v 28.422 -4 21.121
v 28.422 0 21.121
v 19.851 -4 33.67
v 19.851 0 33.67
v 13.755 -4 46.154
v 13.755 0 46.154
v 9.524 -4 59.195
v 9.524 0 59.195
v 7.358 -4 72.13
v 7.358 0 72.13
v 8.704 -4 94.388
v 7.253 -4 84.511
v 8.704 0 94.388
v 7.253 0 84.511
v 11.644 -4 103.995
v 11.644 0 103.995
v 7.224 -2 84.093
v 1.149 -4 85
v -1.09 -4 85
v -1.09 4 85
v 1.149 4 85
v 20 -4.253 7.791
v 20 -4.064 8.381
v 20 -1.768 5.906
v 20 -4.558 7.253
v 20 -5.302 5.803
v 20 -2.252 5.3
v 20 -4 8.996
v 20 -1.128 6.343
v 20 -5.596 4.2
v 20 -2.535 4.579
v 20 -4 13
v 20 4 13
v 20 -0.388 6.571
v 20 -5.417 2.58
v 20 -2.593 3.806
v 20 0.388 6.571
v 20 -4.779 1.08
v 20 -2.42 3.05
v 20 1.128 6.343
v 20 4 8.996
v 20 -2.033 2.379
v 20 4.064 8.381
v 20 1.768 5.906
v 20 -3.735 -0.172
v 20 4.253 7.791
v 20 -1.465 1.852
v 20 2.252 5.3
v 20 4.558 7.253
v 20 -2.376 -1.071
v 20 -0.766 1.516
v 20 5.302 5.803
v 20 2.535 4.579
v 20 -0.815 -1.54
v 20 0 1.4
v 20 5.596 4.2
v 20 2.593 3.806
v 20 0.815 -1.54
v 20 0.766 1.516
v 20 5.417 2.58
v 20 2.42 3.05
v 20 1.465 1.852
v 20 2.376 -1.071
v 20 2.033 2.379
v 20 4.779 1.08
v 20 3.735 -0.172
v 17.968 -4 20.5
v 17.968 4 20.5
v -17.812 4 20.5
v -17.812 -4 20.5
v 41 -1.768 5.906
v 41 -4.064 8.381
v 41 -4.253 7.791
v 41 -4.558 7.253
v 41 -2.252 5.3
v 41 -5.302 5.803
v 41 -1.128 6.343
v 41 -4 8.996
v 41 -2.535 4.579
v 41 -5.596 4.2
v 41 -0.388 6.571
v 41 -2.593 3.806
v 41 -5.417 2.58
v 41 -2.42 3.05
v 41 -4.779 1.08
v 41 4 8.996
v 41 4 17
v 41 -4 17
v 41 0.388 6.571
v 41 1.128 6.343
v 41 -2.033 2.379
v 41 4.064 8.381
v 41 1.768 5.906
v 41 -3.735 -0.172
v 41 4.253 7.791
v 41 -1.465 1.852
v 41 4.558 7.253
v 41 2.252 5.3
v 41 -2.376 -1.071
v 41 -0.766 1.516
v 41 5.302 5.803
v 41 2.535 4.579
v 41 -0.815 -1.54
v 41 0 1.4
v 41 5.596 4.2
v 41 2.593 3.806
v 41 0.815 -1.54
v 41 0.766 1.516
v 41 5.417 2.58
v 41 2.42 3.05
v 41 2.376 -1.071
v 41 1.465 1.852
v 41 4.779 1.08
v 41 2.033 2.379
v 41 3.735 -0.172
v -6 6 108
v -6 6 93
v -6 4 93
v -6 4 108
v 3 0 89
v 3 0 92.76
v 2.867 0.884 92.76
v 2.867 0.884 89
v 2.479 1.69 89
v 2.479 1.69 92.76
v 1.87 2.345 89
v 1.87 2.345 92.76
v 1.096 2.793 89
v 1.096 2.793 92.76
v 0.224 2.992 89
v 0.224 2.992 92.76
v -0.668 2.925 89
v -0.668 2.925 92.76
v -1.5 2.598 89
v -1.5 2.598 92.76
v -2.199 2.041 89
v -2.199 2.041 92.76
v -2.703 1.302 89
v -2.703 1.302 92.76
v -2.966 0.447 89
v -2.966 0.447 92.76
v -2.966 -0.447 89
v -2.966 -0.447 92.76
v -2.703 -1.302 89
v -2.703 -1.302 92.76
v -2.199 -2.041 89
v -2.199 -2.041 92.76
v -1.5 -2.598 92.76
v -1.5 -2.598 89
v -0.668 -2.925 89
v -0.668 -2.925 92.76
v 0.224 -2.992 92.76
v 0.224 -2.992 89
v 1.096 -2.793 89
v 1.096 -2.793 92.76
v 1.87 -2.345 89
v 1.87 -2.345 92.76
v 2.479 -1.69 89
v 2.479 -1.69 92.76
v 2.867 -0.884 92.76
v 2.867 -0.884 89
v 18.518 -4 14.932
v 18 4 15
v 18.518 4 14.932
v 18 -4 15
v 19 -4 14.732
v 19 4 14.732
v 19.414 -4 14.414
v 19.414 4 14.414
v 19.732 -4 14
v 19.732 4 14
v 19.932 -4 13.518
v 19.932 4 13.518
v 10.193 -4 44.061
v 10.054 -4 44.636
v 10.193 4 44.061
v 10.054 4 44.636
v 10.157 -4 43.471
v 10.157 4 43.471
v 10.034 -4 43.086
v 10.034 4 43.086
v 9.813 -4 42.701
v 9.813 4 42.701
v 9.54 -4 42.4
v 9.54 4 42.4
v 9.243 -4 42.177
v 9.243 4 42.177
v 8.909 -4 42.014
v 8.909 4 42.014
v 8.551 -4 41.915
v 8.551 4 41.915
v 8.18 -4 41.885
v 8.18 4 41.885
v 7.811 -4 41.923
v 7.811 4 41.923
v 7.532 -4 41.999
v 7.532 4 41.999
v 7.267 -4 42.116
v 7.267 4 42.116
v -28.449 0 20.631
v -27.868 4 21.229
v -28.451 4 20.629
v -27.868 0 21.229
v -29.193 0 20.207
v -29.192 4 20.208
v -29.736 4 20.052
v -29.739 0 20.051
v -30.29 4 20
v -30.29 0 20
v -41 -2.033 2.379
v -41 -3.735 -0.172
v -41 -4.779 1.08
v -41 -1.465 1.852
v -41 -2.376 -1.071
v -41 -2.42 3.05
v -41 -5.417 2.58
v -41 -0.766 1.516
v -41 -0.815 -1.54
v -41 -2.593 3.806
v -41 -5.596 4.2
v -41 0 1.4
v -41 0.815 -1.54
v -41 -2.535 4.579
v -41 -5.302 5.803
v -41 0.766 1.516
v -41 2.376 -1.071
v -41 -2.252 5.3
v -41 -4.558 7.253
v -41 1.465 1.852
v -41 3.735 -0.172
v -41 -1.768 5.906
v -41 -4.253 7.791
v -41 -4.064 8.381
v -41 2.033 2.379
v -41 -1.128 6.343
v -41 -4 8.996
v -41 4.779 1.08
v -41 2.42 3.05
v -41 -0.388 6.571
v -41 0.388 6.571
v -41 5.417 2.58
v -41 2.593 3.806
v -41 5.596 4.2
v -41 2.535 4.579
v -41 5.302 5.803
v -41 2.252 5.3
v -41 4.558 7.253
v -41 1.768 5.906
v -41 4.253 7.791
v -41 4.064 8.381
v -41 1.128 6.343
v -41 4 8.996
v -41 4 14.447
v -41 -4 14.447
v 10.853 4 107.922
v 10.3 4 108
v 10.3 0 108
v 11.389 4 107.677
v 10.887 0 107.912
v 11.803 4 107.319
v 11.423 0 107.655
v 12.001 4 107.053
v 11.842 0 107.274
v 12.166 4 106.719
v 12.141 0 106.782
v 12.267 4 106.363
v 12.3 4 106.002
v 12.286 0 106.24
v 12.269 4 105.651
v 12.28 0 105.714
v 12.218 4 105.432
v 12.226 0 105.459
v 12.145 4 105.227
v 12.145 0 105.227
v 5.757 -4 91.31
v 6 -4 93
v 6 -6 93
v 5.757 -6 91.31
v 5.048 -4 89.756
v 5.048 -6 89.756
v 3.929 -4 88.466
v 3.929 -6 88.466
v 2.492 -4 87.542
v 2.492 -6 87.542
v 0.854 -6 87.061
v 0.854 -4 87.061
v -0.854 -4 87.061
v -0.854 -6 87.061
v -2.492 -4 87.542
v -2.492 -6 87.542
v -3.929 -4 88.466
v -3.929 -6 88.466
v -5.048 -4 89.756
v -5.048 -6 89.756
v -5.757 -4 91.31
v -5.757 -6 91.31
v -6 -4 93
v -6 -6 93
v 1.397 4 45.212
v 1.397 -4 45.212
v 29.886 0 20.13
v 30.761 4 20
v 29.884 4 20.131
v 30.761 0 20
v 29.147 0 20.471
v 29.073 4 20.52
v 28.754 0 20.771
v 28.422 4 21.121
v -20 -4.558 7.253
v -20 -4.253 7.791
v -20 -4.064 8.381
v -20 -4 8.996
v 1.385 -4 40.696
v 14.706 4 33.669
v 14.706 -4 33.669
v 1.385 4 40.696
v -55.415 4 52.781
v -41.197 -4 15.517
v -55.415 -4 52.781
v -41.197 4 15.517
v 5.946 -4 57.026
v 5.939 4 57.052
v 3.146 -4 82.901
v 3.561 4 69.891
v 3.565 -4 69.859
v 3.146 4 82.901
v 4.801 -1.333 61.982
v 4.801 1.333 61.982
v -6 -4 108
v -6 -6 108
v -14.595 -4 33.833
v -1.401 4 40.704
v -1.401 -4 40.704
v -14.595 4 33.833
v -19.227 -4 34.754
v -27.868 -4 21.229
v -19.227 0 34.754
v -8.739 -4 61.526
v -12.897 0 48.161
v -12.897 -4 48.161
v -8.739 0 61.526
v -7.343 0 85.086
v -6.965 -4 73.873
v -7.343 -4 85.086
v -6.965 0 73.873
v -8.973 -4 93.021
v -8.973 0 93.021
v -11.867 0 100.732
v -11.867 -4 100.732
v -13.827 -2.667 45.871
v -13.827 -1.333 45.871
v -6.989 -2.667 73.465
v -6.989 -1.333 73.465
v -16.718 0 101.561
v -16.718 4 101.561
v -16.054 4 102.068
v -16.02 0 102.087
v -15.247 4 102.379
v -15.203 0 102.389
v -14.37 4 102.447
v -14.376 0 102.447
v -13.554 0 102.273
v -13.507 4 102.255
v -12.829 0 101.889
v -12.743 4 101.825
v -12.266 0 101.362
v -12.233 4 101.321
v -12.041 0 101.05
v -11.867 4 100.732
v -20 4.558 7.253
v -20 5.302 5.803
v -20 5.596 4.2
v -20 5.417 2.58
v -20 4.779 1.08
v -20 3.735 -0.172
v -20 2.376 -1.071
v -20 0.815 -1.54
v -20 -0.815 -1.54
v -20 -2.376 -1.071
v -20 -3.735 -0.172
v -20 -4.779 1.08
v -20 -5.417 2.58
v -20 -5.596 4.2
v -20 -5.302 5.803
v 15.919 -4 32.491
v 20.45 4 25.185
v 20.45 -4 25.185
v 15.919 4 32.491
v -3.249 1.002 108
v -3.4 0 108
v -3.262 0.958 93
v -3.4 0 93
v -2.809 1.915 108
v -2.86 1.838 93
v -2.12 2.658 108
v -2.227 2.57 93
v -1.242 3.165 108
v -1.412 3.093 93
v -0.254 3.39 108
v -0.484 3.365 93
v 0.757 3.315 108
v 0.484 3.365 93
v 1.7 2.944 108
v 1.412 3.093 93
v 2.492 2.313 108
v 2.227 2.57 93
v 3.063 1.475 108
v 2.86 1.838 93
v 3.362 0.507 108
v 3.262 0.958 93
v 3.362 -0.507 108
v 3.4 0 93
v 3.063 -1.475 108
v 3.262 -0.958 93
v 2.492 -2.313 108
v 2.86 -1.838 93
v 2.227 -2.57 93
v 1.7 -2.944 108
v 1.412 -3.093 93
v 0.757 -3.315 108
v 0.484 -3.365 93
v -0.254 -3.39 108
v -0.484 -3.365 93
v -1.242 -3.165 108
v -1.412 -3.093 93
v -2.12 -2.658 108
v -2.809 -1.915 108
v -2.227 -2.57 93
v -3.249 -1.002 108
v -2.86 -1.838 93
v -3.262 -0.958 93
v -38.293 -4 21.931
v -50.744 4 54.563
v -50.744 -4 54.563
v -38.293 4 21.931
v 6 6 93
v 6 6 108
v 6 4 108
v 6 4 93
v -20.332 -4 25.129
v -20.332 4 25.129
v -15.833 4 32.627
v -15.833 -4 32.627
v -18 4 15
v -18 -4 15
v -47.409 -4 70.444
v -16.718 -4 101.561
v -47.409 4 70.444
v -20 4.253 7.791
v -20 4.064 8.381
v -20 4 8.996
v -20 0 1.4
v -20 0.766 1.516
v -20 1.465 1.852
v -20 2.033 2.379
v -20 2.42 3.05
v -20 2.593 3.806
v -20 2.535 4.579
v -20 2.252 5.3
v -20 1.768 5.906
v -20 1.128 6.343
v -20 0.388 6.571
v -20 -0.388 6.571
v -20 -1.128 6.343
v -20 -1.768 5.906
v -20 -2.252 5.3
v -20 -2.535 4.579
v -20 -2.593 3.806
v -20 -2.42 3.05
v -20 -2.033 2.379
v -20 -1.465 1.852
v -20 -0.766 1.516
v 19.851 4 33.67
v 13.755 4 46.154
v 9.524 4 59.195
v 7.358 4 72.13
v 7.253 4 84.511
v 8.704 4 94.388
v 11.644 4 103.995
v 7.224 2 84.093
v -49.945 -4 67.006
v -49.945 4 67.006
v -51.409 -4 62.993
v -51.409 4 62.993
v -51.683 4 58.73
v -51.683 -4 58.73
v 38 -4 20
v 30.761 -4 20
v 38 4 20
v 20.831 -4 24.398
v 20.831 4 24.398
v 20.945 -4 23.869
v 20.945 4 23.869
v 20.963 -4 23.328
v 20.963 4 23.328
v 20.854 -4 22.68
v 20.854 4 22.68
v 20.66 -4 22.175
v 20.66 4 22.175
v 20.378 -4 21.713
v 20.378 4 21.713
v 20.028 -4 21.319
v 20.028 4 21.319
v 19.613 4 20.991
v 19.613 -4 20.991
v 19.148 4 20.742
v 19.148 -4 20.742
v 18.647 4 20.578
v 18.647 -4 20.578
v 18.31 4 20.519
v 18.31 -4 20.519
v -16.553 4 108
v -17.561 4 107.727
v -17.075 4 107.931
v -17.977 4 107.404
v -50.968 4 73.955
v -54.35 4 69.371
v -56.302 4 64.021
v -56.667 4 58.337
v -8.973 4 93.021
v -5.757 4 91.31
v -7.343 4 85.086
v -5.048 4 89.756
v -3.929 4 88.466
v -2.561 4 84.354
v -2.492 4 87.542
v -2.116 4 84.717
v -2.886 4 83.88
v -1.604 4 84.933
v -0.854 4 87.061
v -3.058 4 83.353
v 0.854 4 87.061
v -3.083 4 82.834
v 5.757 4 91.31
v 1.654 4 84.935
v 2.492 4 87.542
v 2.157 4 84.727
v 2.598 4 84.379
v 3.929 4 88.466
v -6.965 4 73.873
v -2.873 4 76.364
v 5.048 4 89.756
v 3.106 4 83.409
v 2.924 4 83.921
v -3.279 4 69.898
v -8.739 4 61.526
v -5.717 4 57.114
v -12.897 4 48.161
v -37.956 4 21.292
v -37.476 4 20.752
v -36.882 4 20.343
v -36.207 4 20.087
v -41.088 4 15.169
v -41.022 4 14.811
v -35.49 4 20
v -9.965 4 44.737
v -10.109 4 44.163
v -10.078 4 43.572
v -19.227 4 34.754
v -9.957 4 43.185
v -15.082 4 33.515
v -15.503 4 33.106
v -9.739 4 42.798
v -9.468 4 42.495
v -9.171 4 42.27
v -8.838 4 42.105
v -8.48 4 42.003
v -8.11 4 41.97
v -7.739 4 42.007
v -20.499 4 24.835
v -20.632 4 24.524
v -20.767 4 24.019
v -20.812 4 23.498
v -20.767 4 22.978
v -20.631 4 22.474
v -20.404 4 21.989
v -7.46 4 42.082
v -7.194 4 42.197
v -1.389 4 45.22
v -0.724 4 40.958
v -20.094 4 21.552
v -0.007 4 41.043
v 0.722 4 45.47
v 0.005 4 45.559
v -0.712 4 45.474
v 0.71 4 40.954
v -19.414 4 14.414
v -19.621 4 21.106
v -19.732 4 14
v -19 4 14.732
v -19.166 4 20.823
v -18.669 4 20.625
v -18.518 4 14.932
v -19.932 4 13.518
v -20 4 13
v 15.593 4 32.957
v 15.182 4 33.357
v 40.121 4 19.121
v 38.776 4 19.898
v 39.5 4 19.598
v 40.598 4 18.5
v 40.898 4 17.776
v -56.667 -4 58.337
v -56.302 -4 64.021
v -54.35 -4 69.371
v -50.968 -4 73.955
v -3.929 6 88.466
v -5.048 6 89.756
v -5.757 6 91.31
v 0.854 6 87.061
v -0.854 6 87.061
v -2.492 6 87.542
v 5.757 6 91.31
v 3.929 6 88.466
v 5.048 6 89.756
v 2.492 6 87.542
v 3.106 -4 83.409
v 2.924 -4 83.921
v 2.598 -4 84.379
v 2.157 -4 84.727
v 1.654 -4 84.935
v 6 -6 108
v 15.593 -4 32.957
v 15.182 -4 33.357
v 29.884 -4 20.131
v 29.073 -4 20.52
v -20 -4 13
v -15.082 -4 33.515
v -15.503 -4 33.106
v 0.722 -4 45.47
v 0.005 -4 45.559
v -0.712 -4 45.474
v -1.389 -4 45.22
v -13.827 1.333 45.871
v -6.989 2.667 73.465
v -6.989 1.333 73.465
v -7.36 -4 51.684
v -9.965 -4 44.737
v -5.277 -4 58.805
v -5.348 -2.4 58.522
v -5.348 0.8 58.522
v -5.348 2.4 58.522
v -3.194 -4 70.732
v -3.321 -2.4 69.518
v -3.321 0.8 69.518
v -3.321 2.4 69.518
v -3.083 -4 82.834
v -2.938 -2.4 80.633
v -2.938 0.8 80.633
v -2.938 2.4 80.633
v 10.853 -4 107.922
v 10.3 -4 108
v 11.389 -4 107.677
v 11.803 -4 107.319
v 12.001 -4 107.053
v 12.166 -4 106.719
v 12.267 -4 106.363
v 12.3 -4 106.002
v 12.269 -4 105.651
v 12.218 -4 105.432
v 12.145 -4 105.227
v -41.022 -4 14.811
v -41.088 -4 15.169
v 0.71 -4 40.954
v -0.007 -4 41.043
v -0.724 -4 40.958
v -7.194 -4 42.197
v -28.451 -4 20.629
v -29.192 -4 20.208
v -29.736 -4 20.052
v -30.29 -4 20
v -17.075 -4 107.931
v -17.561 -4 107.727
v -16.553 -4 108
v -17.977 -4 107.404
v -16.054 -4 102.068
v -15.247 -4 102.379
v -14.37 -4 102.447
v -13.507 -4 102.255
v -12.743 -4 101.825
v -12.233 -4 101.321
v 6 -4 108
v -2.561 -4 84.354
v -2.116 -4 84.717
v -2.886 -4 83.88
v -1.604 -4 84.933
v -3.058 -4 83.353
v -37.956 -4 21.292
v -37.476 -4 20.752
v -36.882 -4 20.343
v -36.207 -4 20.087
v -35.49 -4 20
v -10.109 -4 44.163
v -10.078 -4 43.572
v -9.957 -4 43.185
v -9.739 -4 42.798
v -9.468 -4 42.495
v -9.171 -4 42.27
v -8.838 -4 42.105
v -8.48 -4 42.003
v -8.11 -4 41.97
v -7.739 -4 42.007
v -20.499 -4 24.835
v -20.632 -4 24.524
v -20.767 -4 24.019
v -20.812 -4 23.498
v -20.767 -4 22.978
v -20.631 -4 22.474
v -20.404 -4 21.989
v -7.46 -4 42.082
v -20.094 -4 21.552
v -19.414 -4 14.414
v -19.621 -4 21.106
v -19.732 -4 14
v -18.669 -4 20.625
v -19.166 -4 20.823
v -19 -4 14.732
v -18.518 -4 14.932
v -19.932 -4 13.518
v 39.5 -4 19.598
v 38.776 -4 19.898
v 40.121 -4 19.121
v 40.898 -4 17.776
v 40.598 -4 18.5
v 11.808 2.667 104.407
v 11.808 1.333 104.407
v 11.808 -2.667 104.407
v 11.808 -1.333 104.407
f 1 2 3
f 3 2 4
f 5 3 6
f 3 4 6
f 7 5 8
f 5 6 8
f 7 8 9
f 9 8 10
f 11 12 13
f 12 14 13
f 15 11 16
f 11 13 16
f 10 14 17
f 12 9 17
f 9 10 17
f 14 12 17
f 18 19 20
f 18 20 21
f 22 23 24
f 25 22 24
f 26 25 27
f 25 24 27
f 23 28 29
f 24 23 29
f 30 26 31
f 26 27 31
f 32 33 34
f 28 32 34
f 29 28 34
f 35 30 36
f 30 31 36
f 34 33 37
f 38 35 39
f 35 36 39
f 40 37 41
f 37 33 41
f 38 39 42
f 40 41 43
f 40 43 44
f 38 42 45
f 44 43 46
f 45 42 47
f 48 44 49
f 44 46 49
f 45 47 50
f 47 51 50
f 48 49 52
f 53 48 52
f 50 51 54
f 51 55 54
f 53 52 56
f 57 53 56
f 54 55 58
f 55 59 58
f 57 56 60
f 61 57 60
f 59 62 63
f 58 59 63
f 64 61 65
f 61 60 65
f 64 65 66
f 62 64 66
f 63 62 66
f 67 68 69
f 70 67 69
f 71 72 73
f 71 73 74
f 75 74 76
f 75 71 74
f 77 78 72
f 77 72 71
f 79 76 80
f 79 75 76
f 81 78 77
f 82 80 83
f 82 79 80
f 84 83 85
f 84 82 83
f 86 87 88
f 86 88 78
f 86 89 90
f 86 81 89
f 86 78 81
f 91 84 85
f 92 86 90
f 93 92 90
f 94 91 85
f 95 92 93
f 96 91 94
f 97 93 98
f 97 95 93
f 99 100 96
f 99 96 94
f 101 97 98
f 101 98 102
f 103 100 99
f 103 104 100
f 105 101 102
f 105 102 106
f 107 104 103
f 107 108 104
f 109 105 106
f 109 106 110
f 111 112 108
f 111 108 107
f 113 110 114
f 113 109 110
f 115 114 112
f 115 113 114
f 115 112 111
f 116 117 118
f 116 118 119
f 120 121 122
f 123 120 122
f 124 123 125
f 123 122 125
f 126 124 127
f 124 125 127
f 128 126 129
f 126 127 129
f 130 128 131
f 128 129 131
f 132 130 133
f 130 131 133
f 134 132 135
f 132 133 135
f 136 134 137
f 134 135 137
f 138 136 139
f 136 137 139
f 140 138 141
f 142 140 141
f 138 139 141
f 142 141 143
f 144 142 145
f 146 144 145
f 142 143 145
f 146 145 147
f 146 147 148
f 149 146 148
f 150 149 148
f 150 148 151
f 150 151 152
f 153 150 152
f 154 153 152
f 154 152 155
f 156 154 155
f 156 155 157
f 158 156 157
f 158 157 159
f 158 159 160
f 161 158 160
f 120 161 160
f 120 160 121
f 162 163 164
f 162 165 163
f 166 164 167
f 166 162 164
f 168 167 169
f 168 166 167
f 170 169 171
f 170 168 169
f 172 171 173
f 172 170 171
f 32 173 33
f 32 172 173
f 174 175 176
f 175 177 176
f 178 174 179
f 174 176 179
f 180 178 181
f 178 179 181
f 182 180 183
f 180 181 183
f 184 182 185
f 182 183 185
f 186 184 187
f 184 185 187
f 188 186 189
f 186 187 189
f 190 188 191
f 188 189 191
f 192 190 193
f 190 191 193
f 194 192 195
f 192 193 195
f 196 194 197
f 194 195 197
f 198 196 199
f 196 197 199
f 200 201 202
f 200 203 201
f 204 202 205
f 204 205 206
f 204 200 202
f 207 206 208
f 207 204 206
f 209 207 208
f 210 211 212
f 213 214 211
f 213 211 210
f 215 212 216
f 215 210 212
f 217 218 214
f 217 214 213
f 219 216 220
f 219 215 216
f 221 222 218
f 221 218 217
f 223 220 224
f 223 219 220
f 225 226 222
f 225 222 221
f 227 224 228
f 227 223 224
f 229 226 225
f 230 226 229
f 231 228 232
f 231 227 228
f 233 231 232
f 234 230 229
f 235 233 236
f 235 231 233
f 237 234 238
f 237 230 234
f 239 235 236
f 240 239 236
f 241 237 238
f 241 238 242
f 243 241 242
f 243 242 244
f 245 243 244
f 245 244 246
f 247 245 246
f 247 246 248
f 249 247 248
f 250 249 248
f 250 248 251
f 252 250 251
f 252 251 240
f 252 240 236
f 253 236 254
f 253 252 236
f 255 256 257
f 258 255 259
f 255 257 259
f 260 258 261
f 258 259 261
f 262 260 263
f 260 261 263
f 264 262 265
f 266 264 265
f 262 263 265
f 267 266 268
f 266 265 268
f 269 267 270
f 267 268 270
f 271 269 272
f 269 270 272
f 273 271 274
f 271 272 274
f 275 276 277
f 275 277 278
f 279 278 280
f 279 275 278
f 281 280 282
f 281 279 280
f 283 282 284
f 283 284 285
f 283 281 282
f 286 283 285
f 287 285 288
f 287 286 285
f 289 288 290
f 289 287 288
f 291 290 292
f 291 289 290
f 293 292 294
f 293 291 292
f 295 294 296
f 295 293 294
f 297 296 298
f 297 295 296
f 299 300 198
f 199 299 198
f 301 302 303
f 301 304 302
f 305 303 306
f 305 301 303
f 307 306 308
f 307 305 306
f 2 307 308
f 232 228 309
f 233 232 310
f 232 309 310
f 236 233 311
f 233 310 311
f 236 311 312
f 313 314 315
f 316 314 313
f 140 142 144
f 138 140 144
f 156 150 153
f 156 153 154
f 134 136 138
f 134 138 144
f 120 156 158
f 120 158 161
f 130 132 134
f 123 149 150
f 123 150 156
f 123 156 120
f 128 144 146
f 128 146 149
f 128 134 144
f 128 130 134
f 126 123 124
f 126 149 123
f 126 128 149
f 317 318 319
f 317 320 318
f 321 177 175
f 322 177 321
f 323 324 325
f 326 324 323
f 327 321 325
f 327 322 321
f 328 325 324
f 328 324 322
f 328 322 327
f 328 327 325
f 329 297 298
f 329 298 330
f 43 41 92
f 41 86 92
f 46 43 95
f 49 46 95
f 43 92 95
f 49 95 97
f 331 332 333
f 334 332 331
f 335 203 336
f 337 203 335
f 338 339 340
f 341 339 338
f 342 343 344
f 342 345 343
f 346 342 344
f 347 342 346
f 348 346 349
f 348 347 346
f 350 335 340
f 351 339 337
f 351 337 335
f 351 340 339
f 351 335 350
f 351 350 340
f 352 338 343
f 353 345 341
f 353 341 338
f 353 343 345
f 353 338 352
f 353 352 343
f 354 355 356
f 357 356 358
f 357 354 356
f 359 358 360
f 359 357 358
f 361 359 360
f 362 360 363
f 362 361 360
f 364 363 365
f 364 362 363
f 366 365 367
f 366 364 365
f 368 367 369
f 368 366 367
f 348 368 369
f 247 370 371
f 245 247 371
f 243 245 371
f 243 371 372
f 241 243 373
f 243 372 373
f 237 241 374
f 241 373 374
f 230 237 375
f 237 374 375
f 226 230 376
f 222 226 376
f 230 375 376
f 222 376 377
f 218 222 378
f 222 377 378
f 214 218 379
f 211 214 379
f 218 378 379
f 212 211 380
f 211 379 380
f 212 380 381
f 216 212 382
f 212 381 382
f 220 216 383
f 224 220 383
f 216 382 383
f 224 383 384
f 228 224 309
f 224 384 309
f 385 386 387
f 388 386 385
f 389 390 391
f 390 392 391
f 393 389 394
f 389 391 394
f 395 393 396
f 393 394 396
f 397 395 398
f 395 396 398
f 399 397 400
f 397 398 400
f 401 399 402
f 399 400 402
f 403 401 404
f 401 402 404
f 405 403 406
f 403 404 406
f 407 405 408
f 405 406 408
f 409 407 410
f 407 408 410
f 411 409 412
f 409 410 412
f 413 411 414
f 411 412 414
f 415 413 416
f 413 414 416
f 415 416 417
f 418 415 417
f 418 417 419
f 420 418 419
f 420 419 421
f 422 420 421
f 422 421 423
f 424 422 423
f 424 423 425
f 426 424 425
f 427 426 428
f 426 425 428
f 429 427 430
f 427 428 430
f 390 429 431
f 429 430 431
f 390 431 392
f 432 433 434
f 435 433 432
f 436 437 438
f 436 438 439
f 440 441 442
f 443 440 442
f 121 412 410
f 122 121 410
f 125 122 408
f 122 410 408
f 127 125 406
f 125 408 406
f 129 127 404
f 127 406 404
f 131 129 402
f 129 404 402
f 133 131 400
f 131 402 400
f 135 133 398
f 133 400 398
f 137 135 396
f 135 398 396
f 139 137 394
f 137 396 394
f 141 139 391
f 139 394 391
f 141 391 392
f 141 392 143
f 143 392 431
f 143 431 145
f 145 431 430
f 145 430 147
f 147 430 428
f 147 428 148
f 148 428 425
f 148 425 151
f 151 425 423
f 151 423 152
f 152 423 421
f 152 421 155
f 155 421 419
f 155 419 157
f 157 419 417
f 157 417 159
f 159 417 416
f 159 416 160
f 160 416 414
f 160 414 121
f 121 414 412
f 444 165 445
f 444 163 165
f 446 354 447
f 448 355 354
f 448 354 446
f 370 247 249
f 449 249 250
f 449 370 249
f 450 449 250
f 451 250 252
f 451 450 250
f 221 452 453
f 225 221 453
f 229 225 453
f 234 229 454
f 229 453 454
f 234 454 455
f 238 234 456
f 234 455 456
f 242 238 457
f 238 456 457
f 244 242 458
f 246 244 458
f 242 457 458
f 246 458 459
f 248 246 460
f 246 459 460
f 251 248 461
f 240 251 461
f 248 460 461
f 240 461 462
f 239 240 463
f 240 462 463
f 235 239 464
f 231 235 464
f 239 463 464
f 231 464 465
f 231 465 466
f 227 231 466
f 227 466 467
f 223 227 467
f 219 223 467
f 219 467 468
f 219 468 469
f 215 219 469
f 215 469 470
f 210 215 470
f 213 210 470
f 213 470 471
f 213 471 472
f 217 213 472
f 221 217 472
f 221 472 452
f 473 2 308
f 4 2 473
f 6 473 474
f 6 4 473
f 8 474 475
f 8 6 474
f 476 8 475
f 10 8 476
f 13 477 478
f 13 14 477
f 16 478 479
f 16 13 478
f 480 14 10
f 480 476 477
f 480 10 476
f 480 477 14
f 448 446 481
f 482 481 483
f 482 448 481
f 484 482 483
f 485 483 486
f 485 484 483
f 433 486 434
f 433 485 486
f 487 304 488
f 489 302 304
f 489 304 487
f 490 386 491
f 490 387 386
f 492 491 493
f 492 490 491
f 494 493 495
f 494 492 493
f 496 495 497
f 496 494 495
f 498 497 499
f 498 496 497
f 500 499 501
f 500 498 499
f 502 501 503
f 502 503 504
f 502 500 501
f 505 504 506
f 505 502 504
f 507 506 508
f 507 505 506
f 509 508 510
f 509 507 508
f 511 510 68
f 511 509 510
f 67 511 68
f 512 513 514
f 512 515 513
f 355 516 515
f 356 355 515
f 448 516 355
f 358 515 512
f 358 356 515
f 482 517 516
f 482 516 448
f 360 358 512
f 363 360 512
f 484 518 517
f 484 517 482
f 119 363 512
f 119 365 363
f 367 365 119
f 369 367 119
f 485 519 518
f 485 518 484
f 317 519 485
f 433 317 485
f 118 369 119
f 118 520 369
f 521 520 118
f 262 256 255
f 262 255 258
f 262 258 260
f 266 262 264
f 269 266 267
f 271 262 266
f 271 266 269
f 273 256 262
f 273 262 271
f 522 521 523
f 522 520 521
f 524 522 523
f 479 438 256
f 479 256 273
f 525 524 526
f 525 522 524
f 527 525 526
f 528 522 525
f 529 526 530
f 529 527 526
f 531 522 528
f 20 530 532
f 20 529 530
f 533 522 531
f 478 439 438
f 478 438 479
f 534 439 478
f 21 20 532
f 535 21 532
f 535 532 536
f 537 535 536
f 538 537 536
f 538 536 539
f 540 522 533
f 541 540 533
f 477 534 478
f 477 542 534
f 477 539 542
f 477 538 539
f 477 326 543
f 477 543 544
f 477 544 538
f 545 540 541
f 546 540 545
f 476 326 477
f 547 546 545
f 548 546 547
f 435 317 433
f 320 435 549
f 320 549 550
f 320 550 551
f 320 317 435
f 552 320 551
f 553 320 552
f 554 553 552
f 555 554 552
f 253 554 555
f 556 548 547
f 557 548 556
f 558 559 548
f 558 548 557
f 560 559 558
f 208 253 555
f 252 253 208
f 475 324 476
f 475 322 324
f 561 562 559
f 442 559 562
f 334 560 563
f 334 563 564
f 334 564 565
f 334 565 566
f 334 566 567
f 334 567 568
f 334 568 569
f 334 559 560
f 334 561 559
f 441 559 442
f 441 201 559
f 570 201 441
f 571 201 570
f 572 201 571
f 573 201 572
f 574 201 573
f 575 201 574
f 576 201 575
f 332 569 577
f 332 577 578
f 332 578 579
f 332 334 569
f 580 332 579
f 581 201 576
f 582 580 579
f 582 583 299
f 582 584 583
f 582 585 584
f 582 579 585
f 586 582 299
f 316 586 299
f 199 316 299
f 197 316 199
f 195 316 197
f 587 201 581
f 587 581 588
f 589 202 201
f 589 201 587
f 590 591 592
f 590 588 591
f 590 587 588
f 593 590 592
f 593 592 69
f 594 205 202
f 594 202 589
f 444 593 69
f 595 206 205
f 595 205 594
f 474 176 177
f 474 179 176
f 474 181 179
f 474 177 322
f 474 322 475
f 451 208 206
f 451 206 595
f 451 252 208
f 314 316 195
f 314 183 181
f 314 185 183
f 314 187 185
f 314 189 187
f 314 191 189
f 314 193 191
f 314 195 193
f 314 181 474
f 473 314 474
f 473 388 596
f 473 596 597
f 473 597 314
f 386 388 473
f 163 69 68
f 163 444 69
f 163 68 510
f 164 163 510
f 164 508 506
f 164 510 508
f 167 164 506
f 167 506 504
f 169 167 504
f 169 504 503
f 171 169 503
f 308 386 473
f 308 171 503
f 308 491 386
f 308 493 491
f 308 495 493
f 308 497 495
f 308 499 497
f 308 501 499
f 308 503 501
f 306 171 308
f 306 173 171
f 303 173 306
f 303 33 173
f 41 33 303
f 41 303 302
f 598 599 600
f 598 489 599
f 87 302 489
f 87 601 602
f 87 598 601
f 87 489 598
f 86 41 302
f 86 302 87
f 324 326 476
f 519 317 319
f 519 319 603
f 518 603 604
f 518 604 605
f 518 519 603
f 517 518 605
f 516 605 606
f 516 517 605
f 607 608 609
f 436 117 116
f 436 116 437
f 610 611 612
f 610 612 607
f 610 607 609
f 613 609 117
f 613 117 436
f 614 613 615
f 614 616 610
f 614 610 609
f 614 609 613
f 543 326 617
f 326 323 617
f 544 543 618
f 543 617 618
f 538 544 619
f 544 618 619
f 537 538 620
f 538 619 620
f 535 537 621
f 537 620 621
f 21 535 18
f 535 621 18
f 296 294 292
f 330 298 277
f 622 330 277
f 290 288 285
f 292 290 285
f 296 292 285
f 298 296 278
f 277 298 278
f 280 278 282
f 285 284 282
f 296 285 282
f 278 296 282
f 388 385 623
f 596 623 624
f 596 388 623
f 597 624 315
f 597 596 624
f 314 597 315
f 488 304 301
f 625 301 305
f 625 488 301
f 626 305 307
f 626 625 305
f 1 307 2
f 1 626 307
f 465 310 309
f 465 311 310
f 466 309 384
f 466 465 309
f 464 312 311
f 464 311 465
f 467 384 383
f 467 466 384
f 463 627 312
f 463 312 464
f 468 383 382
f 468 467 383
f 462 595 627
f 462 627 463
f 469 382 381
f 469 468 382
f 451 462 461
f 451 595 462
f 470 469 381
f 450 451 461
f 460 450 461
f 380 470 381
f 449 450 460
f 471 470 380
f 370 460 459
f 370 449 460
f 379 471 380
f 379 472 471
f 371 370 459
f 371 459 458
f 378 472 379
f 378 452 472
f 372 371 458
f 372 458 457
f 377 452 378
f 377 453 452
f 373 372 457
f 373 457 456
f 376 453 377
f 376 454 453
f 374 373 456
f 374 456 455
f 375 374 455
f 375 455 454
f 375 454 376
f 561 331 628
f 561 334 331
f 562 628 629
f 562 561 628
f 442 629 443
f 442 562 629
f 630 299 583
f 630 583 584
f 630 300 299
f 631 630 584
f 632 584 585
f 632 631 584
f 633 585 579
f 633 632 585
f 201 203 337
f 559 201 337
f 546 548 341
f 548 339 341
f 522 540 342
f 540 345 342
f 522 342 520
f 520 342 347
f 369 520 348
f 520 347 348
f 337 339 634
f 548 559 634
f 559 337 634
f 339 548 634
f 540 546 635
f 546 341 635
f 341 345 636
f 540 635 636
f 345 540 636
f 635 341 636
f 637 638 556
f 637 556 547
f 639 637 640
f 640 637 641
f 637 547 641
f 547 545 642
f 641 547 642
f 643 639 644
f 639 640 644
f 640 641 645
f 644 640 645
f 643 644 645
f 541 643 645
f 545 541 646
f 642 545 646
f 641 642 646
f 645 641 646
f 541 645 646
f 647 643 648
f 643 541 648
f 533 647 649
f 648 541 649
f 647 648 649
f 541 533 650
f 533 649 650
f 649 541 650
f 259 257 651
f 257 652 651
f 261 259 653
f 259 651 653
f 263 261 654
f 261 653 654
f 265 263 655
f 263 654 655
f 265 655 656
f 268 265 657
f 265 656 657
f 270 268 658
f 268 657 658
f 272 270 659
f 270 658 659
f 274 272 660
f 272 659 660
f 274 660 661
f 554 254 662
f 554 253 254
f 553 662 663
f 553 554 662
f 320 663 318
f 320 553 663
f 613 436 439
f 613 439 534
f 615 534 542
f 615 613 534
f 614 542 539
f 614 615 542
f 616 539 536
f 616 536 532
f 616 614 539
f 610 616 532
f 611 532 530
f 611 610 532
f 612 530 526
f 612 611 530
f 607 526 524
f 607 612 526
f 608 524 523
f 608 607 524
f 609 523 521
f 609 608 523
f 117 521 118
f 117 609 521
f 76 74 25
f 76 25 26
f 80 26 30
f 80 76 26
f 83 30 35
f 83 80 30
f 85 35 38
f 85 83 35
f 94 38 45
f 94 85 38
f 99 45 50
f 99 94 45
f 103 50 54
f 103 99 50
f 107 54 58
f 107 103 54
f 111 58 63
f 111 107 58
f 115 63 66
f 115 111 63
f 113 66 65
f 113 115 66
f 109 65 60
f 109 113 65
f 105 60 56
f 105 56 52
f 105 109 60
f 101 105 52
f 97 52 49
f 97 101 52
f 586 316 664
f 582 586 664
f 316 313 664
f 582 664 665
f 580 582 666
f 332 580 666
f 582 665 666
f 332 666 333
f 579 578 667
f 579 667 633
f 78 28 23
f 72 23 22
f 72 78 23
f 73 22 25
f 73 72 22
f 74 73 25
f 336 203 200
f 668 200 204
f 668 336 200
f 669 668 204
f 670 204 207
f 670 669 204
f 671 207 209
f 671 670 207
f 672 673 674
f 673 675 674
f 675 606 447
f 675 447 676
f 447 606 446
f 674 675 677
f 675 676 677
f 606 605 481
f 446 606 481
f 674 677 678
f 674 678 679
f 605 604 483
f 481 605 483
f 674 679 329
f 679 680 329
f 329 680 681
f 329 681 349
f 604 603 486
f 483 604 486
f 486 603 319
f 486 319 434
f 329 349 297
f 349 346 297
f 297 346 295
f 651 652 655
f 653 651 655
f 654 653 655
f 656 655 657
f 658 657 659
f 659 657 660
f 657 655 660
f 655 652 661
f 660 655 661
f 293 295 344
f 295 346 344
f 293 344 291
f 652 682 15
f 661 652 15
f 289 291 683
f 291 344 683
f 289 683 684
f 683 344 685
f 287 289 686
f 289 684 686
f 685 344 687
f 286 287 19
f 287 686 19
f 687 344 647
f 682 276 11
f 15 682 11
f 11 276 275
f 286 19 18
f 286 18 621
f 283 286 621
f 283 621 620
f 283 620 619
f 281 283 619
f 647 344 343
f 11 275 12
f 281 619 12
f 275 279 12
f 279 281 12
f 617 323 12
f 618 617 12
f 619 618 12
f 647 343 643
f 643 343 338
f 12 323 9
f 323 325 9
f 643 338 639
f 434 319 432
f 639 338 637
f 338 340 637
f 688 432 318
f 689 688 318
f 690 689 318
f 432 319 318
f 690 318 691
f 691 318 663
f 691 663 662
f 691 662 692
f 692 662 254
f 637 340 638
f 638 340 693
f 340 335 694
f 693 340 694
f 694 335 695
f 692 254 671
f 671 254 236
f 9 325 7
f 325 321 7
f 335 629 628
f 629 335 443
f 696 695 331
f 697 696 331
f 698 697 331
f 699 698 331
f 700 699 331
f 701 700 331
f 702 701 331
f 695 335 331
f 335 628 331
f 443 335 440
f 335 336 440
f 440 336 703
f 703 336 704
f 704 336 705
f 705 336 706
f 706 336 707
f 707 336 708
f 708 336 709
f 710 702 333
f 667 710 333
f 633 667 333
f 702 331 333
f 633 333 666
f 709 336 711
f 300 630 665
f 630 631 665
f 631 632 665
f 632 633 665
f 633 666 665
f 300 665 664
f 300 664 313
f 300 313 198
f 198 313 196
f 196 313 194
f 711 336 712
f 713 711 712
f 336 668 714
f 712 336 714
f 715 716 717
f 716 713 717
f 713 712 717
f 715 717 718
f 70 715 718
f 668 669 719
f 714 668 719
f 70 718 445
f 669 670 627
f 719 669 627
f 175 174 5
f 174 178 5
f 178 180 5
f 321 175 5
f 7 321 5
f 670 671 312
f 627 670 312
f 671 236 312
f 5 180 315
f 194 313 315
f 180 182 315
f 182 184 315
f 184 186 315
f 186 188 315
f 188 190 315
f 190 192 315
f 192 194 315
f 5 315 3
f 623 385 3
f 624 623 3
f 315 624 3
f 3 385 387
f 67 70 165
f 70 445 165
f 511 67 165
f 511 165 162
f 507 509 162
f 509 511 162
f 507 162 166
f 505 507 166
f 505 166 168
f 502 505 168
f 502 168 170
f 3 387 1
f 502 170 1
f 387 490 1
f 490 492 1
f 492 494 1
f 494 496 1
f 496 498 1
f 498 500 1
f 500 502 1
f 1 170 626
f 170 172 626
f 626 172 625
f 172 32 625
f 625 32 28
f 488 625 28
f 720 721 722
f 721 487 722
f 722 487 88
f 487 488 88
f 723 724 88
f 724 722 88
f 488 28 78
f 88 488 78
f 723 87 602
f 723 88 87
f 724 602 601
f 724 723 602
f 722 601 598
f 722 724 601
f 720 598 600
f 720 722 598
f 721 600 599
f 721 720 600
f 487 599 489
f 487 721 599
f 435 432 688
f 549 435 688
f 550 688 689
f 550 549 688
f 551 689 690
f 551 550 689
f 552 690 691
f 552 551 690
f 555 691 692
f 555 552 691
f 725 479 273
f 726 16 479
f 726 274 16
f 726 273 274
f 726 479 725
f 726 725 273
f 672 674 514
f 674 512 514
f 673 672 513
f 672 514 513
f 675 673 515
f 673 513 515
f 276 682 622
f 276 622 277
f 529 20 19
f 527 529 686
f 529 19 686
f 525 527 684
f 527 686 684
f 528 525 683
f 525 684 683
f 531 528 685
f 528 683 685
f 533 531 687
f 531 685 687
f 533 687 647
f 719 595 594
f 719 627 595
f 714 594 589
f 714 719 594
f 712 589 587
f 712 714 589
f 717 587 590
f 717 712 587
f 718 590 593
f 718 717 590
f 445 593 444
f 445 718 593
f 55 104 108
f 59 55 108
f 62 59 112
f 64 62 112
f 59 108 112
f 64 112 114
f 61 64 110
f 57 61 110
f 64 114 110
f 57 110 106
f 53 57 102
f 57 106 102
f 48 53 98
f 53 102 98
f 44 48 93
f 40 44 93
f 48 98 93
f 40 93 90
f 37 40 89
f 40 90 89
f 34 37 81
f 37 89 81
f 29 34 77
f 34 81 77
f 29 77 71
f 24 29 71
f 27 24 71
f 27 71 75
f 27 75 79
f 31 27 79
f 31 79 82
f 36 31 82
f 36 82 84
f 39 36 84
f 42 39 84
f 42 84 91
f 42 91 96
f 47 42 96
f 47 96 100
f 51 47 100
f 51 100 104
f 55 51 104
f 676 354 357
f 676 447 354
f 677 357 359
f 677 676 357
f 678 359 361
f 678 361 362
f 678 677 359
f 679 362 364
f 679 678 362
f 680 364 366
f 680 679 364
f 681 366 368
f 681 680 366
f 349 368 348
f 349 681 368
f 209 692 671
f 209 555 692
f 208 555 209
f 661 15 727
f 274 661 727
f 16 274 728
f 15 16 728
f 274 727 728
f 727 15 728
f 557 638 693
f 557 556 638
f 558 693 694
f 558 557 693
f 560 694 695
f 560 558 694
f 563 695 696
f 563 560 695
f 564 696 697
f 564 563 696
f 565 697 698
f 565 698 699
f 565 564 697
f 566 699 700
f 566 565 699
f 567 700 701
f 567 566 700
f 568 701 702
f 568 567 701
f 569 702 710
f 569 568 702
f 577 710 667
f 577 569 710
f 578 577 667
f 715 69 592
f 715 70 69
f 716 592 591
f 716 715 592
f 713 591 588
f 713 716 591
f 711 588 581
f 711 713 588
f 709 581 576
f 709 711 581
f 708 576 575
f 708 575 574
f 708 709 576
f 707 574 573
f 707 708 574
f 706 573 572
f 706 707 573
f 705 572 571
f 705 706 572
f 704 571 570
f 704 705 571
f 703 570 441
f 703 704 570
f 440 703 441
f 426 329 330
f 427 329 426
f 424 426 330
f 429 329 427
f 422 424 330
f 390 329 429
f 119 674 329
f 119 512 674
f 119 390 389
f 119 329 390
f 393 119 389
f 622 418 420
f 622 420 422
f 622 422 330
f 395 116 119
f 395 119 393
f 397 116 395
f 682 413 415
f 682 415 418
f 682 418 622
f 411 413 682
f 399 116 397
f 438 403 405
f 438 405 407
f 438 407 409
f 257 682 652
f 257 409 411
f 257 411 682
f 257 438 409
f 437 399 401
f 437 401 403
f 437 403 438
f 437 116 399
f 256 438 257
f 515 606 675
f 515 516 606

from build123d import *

# Parameters (mm, degrees)
EXTRUDE_1_DEPTH        = 4
FILLET_1_R             = 4
SKETCH_4_R             = 2.6
CUT_EXTRUDE_1_DEPTH    = 146.708473979
FILLET_2_R             = 3
FILLET_3_R             = 3
SKETCH_6_R             = 6
EXTRUDE_3_DEPTH        = 6
CUT_EXTRUDE_2_DEPTH    = 12
FILLET_4_R             = 3
FILLET_5_R             = 2
FILLET_6_R             = 2
EXTRUDE_5_DEPTH        = 8
FILLET_7_R             = 2
FILLET_8_R             = 3
FILLET_9_R             = 2
FILLET_10_R            = 2
SKETCH_11_R            = 3
CUT_EXTRUDE_3_DEPTH    = 19
HOLE_WIZARD_M8_3_D     = 6.8
HOLE_WIZARD_M8_3_DEPTH = 15
HOLE_WIZARD_M8_3_TIP   = 2.042926105
SKETCH_14_R            = 5.6
SKETCH_14_R_2          = 2.6
EXTRUDE_6_DEPTH        = 21
EXTRUDE_START          = -21
SKETCH_15_R            = 5.6
SKETCH_15_R_2          = 2.6
EXTRUDE_7_DEPTH        = 21
FILLET_11_R            = 3


with BuildPart() as part:
    # 草图1 → 凸台-拉伸1 (new, symmetric)
    with BuildSketch(Plane(origin=(0, 0, 0), x_dir=(1, 0, 0), z_dir=(0, 1, 0))):
        with BuildLine():
            Line((-20, 0), (-41, 0))
            Line((-41, 0), (-41, -15))
            Line((-41, -15), (-55.415081473, -52.780871033))
            ThreePointArc((-55.415081473, -52.780871033), (-56.302035651, -64.020992263), (-50.968339036, -73.954707247))
            Line((-50.968339036, -73.954707247), (-17.38942166, -108))
            Line((-17.38942166, -108), (13.387176951, -108))
            add(Edge.make_bspline(
                [(11.643587669, -103.995199619), (12.175396299, -105.343239297), (12.756125427, -106.67877823), (13.387176951, -108)],
                knots=[1, 1, 1, 1, 1.048078106, 1.048078106, 1.048078106, 1.048078106], degree=3))
            add(Edge.make_bspline(
                [(29.336714137, -20), (14.953042407, -37.358957509), (2.894073745, -68.302879354), (9.112352893, -97.578972573), (11.643587669, -103.995199619)],
                knots=[0, 0, 0, 0, 0.771163971, 1, 1, 1, 1], degree=3))
            Line((29.336714137, -20), (41, -20))
            Line((41, -20), (41, -15))
            Line((41, -15), (41, 0))
            Line((41, 0), (20, 0))
            Line((20, 0), (20, -15))
            Line((20, -15), (-20, -15))
            Line((-20, -15), (-20, 0))
        make_face()
        with BuildLine():
            Line((-37.556142637, -20), (-28.778071319, -20))
            add(Edge.make_bspline(
                [(-28.778071319, -20), (-11.398449347, -43.180650425), (1.816105739, -77.326056937), (-13.829589339, -104.488932663)],
                knots=[0, 0, 0, 0, 1, 1, 1, 1], degree=3))
            Line((-13.829589339, -104.488932663), (-47.408506715, -70.44363991))
            ThreePointArc((-47.408506715, -70.44363991), (-51.408779177, -62.993353671), (-50.743563543, -54.563262749))
            Line((-50.743563543, -54.563262749), (-37.556142637, -20))
        make_face(mode=Mode.SUBTRACT)
    extrude(amount=EXTRUDE_1_DEPTH, both=True)

    # 圆角1
    fillet_1_edges = [part.edges().sort_by_distance(p)[0] for p in [
        (-30.5, 4, 0),
        (-30.5, -4, 0),
        (30.5, -4, 0),
        (30.5, 4, 0),
    ]]
    fillet(fillet_1_edges, radius=FILLET_1_R - 0.0001)  # a hair under: the kernel refuses the full size

    # 草图4 → 切除-拉伸1 (cut, through all)
    with BuildSketch(Plane(origin=(41, 0, 0), x_dir=(0, 0, -1), z_dir=(1, 0, 0))):
        with Locations((-4, 0)):
            Circle(SKETCH_4_R)
    extrude(amount=-CUT_EXTRUDE_1_DEPTH, mode=Mode.SUBTRACT)

    # 圆角2
    fillet_2_edges = [part.edges().sort_by_distance(p)[0] for p in [
        (-41, 0, 15),
        (-28.778071319, -2, 20),
        (-37.556142637, 0, 20),
        (41, 0, 20),
        (29.336714137, -2, 20),
    ]]
    fillet(fillet_2_edges, radius=FILLET_2_R)

    # 圆角3
    fillet_3_edges = [part.edges().sort_by_distance(p)[0] for p in [
        (-13.829589339, -2, 104.488932663),
    ]]
    fillet(fillet_3_edges, radius=FILLET_3_R)

    # 草图6 → 凸台-拉伸3 (add, symmetric)
    with BuildSketch(Plane(origin=(0, 0, 0), x_dir=(1, 0, 0), z_dir=(0, 1, 0))):
        with BuildLine():
            ThreePointArc((6, -93), (0, -99), (-6, -93))
            Line((-6, -93), (-6, -108))
            Line((-6, -108), (6, -108))
            Line((6, -108), (6, -93))
        make_face()
        with Locations((0, -93)):
            Circle(SKETCH_6_R)
    extrude(amount=EXTRUDE_3_DEPTH, both=True)

    # 草图9 → 切除-拉伸2 (cut)
    with BuildSketch(Plane(origin=(0, 4, 0), x_dir=(1, 0, 0), z_dir=(0, 1, 0))):
        with BuildLine():
            Line((-3.301596304, -85), (3.279031365, -85))
            add(Edge.make_bspline(
                [(23.82705745, -20.5), (19.505008519, -26.151605233), (15.701306988, -32.362525218), (9.075946345, -46.254561975), (6.412430162, -54.023271907), (3.266661612, -69.561604001), (2.686935669, -77.315763608), (3.279031365, -85)],
                knots=[0.025253164, 0.025253164, 0.025253164, 0.025253164, 0.25, 0.25, 0.5, 0.5, 0.73810851, 0.73810851, 0.73810851, 0.73810851], degree=3))
            Line((23.82705745, -20.5), (-23.464882608, -20.5))
            add(Edge.make_bspline(
                [(-23.464882608, -20.5), (-19.745298249, -25.752793711), (-16.265276937, -31.478555693), (-9.934110548, -44.200553579), (-7.185840369, -51.267285983), (-4.428907167, -62.148768173), (-3.737975942, -65.822957616), (-2.903507141, -73.212236362), (-2.760056502, -76.927560065), (-3.008657599, -82.090891991), (-3.128742658, -83.54736568), (-3.301596304, -85)],
                knots=[0.023659765, 0.023659765, 0.023659765, 0.023659765, 0.25, 0.25, 0.5, 0.5, 0.625, 0.625, 0.75, 0.75, 0.799185621, 0.799185621, 0.799185621, 0.799185621], degree=3))
        make_face()
    extrude(amount=-CUT_EXTRUDE_2_DEPTH, mode=Mode.SUBTRACT)

    # 圆角4
    fillet_4_edges = [part.edges().sort_by_distance(p)[0] for p in [
        (23.82705745, 0, 20.5),
        (-23.464882608, 0, 20.5),
    ]]
    fillet(fillet_4_edges, radius=FILLET_4_R)

    # 圆角5
    fillet_5_edges = [part.edges().sort_by_distance(p)[0] for p in [
        (-3.301596304, 0, 85),
        (3.279031365, 0, 85),
    ]]
    fillet(fillet_5_edges, radius=FILLET_5_R)

    # 圆角6
    fillet_6_edges = [part.edges().sort_by_distance(p)[0] for p in [
        (-20, 0, 15),
        (20, 0, 15),
    ]]
    fillet(fillet_6_edges, radius=FILLET_6_R)

    # 草图10 → 凸台-拉伸5 (add)
    with BuildSketch(Plane(origin=(0, 4, 0), x_dir=(1, 0, 0), z_dir=(0, 1, 0))):
        Polygon((-17.607172891, -36.773881534), (0.006004111, -45.946117812), (17.402210236, -36.768943973), (15.535837047, -33.231056027), (-0.006004111, -41.429980382), (-15.759640154, -33.226118466), align=None)
    extrude(amount=-EXTRUDE_5_DEPTH)

    # 圆角7
    fillet_7_edges = [part.edges().sort_by_distance(p)[0] for p in [
        (12.323790715, 0, 39.448007353),
        (-12.270659934, 0, 39.552923483),
    ]]
    fillet(fillet_7_edges, radius=FILLET_7_R)

    # 圆角8
    fillet_8_edges = [part.edges().sort_by_distance(p)[0] for p in [
        (-15.400235002, 0, 33.413282257),
        (15.491481072, 0, 33.254455525),
        (0.006004111, 0, 45.946117812),
        (-0.006004111, 0, 41.429980382),
    ]]
    fillet(fillet_8_edges, radius=FILLET_8_R)

    # 圆角9
    fillet_9_edges = [part.edges().sort_by_distance(p)[0] for p in [
        (13.387176951, -2, 108),
    ]]
    fillet(fillet_9_edges, radius=FILLET_9_R)

    # 圆角10
    fillet_10_edges = [part.edges().sort_by_distance(p)[0] for p in [
        (-17.38942166, 0, 108),
    ]]
    fillet(fillet_10_edges, radius=FILLET_10_R)

    # 草图11 → 切除-拉伸3 (cut)
    with BuildSketch(Plane.XY.offset(108)):
        Circle(SKETCH_11_R)
    extrude(amount=-CUT_EXTRUDE_3_DEPTH, mode=Mode.SUBTRACT)

    # M8 螺纹孔3
    with Locations(Plane.XY.offset(108)):
        with Locations((0, 0)):
            Hole(HOLE_WIZARD_M8_3_D / 2, depth=HOLE_WIZARD_M8_3_DEPTH)
            with Locations((0, 0, -(HOLE_WIZARD_M8_3_DEPTH + HOLE_WIZARD_M8_3_TIP / 2))):  # 118° drill point
                Cone(0, HOLE_WIZARD_M8_3_D / 2, HOLE_WIZARD_M8_3_TIP, mode=Mode.SUBTRACT)

    # 草图14 → 凸台-拉伸6 (add)
    with BuildSketch(Plane(origin=(41, 0, 0), x_dir=(0, 0, -1), z_dir=(1, 0, 0))):
        with Locations((-4, 0)):
            Circle(SKETCH_14_R)
        with Locations((-4, 0)):
            Circle(SKETCH_14_R_2, mode=Mode.SUBTRACT)
    extrude(amount=-EXTRUDE_6_DEPTH)

    # 草图15 → 凸台-拉伸7 (add)
    with BuildSketch(Plane.ZY.offset(41).offset(EXTRUDE_START)):
        with Locations((4, 0)):
            Circle(SKETCH_15_R)
        with Locations(Location((4, 0, 0), (0, 0, 180))):
            Circle(SKETCH_15_R_2, mode=Mode.SUBTRACT)
    extrude(amount=EXTRUDE_7_DEPTH)

    # 圆角11
    fillet_11_edges = [part.edges().sort_by_distance(p)[0] for p in [
        (30.5, -4, 7.919183588),
        (30.5, 4, 7.919183588),
        (-30.5, -4, 7.919183588),
        (-30.5, 4, 7.919183588),
    ]]
    fillet(fillet_11_edges, radius=FILLET_11_R)


solid = part.part
